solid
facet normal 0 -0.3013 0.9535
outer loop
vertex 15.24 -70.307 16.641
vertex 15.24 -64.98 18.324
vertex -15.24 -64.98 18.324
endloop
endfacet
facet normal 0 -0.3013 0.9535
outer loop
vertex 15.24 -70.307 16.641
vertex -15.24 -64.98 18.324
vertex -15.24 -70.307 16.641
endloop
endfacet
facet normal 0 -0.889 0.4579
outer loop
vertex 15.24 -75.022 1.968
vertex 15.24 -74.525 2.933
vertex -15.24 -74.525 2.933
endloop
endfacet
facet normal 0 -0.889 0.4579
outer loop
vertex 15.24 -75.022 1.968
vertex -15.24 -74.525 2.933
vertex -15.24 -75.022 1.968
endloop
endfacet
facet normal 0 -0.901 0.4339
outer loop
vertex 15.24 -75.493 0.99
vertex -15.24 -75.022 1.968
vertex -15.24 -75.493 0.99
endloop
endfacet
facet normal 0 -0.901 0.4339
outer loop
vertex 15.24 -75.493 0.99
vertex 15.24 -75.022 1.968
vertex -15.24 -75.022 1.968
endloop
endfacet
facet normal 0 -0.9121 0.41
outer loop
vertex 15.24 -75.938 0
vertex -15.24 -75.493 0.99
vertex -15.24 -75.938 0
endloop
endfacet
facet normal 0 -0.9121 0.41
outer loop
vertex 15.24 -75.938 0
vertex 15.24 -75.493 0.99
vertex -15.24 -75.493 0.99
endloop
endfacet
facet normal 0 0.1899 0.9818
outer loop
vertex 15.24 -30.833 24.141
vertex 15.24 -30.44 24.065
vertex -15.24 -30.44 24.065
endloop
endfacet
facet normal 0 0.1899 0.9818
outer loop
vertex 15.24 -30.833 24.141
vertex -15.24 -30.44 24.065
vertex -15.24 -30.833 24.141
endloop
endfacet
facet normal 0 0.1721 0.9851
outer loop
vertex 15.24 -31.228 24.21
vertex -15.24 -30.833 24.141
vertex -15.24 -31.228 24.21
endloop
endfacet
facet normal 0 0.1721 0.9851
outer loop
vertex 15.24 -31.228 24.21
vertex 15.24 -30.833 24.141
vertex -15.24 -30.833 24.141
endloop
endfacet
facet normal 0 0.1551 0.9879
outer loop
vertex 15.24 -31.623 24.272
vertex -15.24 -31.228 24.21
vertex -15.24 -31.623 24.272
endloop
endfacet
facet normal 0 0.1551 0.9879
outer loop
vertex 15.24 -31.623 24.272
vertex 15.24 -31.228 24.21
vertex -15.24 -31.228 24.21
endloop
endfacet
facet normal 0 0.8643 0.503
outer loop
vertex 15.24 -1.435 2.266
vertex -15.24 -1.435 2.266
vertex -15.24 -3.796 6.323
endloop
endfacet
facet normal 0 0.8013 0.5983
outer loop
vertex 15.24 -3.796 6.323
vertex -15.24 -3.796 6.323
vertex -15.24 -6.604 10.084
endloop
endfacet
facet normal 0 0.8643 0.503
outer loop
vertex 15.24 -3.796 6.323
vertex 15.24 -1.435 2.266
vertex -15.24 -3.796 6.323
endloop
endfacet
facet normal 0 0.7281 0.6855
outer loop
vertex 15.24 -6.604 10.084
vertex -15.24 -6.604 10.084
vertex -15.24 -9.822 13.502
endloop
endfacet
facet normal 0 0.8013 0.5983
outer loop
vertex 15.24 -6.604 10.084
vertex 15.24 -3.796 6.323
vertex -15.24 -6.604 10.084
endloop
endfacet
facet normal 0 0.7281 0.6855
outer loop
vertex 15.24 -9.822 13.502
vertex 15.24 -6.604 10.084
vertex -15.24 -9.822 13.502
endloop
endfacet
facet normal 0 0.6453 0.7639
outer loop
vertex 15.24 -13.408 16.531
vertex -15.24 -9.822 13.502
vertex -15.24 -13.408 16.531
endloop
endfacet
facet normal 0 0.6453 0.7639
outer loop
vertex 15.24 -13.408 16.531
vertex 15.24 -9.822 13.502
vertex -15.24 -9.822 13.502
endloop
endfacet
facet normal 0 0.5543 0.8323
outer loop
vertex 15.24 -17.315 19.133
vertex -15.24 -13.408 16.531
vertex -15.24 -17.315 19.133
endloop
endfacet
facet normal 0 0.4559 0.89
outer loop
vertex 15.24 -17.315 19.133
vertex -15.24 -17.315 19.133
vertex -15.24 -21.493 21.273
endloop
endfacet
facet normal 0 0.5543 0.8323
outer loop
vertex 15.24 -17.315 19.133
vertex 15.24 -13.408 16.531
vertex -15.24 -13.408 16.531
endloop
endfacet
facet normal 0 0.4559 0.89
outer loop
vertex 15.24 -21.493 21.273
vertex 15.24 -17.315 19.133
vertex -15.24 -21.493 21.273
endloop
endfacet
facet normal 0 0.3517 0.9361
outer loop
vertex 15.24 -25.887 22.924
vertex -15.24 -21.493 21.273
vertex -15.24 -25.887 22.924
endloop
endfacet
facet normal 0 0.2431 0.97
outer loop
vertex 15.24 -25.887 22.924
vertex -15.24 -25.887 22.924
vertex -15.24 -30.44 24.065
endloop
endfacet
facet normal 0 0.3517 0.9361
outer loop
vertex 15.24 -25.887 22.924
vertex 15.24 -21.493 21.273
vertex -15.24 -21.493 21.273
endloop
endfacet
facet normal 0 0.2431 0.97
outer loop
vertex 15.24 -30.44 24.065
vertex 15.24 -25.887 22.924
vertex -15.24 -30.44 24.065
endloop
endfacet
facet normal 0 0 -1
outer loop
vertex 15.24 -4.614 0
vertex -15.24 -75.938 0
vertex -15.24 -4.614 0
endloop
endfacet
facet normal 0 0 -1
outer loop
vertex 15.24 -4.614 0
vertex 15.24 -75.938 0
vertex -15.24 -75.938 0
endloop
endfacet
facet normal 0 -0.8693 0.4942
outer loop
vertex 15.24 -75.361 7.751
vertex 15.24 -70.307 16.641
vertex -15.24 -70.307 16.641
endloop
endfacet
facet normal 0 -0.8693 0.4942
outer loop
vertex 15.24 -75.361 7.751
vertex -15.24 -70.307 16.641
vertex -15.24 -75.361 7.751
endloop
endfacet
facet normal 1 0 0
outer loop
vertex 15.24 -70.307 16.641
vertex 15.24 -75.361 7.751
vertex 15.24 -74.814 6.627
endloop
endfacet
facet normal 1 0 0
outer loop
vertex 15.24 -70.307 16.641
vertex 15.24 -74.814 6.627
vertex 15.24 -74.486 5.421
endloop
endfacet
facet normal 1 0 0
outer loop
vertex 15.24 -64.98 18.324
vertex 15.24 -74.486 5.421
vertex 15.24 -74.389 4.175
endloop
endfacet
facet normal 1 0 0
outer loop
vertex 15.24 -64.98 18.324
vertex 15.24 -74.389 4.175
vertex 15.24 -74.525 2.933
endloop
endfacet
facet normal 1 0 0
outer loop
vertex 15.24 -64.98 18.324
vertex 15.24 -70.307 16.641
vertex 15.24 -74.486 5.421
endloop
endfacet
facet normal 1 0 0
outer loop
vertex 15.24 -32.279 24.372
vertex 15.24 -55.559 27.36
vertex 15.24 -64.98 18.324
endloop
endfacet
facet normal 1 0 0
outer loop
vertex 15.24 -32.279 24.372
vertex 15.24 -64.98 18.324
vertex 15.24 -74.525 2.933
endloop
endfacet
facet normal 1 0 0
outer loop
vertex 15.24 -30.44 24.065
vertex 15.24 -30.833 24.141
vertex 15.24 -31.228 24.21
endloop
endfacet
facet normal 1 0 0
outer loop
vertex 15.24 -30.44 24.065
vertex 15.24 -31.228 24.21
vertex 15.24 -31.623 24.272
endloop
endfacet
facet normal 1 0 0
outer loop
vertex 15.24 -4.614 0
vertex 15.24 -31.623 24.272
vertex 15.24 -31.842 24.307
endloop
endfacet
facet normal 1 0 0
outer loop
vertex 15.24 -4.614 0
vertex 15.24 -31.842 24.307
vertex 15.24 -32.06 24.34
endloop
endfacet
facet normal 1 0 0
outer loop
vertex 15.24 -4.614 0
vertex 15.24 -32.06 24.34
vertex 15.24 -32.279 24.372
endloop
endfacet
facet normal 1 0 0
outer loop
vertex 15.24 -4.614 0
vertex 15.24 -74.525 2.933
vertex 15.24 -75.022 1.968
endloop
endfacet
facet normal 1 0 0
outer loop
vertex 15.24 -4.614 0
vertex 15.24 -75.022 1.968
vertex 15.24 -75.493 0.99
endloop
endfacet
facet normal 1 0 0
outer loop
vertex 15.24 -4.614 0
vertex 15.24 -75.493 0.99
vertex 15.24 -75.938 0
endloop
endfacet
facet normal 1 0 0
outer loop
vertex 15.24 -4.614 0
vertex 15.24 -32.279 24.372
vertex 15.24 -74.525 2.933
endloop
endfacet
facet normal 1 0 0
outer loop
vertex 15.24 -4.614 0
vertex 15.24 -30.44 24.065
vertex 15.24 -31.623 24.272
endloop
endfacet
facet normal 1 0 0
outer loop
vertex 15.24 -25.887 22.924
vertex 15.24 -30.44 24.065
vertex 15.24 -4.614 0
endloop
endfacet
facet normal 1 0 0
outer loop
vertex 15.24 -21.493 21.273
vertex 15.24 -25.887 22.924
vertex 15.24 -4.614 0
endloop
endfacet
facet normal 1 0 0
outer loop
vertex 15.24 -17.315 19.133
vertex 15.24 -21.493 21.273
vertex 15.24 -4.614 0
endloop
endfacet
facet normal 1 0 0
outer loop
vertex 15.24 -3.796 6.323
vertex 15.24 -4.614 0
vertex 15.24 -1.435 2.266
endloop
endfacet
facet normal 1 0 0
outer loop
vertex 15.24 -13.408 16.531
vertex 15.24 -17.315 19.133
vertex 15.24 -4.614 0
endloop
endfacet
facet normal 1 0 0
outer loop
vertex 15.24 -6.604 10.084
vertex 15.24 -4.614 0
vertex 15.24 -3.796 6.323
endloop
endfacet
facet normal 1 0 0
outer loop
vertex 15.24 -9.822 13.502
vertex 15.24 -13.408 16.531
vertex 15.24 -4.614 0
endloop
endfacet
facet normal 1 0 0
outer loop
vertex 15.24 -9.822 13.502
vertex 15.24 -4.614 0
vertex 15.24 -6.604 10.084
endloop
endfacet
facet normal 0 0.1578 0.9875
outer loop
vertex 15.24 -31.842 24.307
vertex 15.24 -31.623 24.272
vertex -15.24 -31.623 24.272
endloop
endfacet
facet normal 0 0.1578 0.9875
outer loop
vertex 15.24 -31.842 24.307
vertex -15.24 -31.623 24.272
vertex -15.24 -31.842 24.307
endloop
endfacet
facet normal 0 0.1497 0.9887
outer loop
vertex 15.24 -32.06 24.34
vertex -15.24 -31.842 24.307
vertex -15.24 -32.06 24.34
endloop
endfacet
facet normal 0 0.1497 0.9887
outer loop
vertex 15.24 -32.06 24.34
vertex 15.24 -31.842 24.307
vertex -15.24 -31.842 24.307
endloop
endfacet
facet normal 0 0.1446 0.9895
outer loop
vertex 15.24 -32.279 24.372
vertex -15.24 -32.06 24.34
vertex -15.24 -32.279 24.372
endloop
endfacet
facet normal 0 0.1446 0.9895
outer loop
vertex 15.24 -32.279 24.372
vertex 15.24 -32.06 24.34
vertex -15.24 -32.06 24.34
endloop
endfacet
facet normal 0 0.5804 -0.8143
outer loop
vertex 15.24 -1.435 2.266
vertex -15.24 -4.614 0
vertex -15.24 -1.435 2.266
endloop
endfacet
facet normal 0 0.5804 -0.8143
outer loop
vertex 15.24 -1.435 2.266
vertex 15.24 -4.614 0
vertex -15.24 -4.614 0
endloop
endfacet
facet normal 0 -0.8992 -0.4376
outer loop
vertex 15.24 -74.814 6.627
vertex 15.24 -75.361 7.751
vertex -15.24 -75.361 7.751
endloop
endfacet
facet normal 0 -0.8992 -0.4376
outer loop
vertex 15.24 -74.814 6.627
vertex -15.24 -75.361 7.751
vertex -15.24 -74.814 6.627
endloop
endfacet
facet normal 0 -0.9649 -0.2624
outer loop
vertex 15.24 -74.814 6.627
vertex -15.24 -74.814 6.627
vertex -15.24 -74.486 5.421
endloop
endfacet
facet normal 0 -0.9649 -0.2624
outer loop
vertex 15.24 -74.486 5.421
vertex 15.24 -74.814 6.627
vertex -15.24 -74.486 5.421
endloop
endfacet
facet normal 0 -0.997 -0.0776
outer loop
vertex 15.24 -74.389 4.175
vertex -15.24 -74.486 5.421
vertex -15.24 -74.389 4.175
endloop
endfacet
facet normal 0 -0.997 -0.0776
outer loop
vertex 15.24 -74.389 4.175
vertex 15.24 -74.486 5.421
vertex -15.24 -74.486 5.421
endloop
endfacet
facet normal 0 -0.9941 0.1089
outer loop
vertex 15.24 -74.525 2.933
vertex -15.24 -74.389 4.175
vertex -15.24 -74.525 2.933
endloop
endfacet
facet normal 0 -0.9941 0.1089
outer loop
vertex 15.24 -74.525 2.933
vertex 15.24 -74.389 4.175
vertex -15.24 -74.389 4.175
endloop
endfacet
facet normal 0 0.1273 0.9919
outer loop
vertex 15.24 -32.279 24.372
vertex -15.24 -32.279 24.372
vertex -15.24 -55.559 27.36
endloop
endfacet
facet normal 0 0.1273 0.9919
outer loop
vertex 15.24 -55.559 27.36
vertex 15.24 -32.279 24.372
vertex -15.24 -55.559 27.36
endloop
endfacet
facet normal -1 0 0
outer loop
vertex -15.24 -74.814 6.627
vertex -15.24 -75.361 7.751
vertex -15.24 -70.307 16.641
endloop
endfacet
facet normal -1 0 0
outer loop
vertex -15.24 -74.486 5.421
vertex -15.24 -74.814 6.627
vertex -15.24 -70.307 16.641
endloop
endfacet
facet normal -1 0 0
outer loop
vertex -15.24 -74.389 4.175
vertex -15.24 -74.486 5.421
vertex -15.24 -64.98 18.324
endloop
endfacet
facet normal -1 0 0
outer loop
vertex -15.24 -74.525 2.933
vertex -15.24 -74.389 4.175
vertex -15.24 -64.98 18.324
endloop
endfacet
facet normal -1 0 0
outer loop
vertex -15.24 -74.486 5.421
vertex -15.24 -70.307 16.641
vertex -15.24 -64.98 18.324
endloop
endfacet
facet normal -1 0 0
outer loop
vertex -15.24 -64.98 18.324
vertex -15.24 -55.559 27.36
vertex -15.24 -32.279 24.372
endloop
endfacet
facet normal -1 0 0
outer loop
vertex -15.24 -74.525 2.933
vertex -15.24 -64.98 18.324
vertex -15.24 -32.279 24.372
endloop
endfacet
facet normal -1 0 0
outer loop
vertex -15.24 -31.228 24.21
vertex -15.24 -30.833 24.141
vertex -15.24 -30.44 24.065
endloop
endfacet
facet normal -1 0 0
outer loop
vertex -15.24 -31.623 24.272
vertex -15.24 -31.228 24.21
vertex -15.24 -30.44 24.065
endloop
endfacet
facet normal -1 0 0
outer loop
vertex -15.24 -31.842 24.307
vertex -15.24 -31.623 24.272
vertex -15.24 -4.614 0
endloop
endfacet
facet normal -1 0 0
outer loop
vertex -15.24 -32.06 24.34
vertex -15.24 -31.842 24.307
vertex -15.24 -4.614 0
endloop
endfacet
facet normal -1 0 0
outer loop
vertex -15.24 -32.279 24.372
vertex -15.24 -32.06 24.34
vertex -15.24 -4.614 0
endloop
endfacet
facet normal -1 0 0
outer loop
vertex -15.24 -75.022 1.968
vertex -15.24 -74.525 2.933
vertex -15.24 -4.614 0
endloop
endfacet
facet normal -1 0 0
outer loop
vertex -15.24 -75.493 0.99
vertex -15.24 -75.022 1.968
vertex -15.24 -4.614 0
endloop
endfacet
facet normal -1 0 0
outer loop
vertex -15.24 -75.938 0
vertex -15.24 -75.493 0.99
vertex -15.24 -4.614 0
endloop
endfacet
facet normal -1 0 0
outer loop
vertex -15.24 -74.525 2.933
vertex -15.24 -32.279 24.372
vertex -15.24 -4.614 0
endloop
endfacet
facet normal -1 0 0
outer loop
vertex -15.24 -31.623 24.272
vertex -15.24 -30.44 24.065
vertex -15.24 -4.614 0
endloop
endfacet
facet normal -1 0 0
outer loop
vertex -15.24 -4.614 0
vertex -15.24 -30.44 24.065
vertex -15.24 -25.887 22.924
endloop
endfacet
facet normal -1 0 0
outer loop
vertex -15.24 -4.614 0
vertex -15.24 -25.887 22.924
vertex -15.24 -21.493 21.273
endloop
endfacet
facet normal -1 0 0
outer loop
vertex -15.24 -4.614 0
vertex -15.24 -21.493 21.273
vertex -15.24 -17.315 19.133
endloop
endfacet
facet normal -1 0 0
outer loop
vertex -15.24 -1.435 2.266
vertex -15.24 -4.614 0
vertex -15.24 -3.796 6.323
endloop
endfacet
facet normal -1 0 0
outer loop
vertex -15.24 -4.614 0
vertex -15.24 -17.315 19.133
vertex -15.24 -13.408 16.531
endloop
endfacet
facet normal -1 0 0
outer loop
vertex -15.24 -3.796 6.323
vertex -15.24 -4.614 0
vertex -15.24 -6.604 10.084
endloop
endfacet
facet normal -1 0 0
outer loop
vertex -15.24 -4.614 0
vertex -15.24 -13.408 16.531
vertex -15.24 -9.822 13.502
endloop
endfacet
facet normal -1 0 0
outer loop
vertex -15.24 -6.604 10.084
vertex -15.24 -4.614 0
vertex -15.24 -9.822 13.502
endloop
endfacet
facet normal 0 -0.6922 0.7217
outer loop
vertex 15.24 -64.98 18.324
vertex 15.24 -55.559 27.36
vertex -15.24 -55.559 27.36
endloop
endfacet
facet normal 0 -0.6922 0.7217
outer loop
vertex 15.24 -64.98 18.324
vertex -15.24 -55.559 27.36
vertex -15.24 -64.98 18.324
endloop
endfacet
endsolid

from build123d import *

# Parameters (mm, degrees)
F1_DEPTH      = 15.24
F1_DEPTH_BACK = 15.24


with BuildPart() as f1:
    # F0 (on Right) → F1 (new body, two sides)
    with BuildSketch(Plane.YZ) as f1_sk:
        with BuildLine():
            ThreePointArc((-1.434684, 2.266193), (-13.407881, 16.531469), (-30.440374, 24.064712))
            ThreePointArc((-30.440374, 24.064712), (-21.972596, 20.363563), (-15.764277, 13.518233))
            ThreePointArc((-15.764277, 13.518233), (-15.114308, 11.234153), (-16.148772, 9.096545))
            Line((-16.148772, 9.096545), (-50.502049, 12.267617))
            ThreePointArc((-50.502049, 12.267617), (-55.179249, 9.077793), (-57.481937, 3.905869))
            Line((-57.481937, 3.905869), (-4.613936, 0))
            Line((-4.613936, 0), (-1.434684, 2.266193))
        make_face()
        with BuildLine():
            ThreePointArc((-30.440374, 24.064712), (-31.030504, 24.176615), (-31.623462, 24.272407))
            ThreePointArc((-31.623462, 24.272407), (-31.031161, 24.172873), (-30.440374, 24.064712))
        make_face()
        with BuildLine():
            ThreePointArc((-74.524937, 2.932697), (-75.260293, 1.480311), (-75.937681, 0))
            ThreePointArc((-75.937681, 0), (-75.049977, 1.378997), (-74.524937, 2.932697))
        make_face()
        Polygon((-4.613936, 0), (-57.481937, 3.905869), (-60.1734, 0), align=None)
        with BuildLine():
            ThreePointArc((-50.502049, 12.267617), (-42.703408, 20.296684), (-32.278686, 24.372209))
            Line((-32.278686, 24.372209), (-55.559464, 27.360039))
            Line((-55.559464, 27.360039), (-64.979583, 18.324416))
            ThreePointArc((-64.979583, 18.324416), (-58.204998, 14.186486), (-50.502049, 12.267617))
        make_face()
        with BuildLine():
            ThreePointArc((-30.440374, 24.064712), (-31.031161, 24.172873), (-31.623462, 24.272407))
            ThreePointArc((-31.623462, 24.272407), (-31.950873, 24.323626), (-32.278686, 24.372209))
            ThreePointArc((-32.278686, 24.372209), (-42.703408, 20.296684), (-50.502049, 12.267617))
            Line((-50.502049, 12.267617), (-16.148772, 9.096545))
            ThreePointArc((-16.148772, 9.096545), (-15.114308, 11.234153), (-15.764277, 13.518233))
            ThreePointArc((-15.764277, 13.518233), (-21.972596, 20.363563), (-30.440374, 24.064712))
        make_face()
        with BuildLine():
            ThreePointArc((-57.481937, 3.905869), (-55.179249, 9.077793), (-50.502049, 12.267617))
            ThreePointArc((-50.502049, 12.267617), (-58.204998, 14.186486), (-64.979583, 18.324416))
            Line((-64.979583, 18.324416), (-70.306638, 16.641369))
            Line((-70.306638, 16.641369), (-75.360931, 7.750814))
            ThreePointArc((-75.360931, 7.750814), (-74.486311, 5.420985), (-74.524937, 2.932697))
            ThreePointArc((-74.524937, 2.932697), (-75.049977, 1.378997), (-75.937681, 0))
            Line((-75.937681, 0), (-60.1734, 0))
            Line((-60.1734, 0), (-57.481937, 3.905869))
        make_face()
    extrude(amount=F1_DEPTH)
    extrude(f1_sk.sketch, amount=-F1_DEPTH_BACK)


solid = f1.part
